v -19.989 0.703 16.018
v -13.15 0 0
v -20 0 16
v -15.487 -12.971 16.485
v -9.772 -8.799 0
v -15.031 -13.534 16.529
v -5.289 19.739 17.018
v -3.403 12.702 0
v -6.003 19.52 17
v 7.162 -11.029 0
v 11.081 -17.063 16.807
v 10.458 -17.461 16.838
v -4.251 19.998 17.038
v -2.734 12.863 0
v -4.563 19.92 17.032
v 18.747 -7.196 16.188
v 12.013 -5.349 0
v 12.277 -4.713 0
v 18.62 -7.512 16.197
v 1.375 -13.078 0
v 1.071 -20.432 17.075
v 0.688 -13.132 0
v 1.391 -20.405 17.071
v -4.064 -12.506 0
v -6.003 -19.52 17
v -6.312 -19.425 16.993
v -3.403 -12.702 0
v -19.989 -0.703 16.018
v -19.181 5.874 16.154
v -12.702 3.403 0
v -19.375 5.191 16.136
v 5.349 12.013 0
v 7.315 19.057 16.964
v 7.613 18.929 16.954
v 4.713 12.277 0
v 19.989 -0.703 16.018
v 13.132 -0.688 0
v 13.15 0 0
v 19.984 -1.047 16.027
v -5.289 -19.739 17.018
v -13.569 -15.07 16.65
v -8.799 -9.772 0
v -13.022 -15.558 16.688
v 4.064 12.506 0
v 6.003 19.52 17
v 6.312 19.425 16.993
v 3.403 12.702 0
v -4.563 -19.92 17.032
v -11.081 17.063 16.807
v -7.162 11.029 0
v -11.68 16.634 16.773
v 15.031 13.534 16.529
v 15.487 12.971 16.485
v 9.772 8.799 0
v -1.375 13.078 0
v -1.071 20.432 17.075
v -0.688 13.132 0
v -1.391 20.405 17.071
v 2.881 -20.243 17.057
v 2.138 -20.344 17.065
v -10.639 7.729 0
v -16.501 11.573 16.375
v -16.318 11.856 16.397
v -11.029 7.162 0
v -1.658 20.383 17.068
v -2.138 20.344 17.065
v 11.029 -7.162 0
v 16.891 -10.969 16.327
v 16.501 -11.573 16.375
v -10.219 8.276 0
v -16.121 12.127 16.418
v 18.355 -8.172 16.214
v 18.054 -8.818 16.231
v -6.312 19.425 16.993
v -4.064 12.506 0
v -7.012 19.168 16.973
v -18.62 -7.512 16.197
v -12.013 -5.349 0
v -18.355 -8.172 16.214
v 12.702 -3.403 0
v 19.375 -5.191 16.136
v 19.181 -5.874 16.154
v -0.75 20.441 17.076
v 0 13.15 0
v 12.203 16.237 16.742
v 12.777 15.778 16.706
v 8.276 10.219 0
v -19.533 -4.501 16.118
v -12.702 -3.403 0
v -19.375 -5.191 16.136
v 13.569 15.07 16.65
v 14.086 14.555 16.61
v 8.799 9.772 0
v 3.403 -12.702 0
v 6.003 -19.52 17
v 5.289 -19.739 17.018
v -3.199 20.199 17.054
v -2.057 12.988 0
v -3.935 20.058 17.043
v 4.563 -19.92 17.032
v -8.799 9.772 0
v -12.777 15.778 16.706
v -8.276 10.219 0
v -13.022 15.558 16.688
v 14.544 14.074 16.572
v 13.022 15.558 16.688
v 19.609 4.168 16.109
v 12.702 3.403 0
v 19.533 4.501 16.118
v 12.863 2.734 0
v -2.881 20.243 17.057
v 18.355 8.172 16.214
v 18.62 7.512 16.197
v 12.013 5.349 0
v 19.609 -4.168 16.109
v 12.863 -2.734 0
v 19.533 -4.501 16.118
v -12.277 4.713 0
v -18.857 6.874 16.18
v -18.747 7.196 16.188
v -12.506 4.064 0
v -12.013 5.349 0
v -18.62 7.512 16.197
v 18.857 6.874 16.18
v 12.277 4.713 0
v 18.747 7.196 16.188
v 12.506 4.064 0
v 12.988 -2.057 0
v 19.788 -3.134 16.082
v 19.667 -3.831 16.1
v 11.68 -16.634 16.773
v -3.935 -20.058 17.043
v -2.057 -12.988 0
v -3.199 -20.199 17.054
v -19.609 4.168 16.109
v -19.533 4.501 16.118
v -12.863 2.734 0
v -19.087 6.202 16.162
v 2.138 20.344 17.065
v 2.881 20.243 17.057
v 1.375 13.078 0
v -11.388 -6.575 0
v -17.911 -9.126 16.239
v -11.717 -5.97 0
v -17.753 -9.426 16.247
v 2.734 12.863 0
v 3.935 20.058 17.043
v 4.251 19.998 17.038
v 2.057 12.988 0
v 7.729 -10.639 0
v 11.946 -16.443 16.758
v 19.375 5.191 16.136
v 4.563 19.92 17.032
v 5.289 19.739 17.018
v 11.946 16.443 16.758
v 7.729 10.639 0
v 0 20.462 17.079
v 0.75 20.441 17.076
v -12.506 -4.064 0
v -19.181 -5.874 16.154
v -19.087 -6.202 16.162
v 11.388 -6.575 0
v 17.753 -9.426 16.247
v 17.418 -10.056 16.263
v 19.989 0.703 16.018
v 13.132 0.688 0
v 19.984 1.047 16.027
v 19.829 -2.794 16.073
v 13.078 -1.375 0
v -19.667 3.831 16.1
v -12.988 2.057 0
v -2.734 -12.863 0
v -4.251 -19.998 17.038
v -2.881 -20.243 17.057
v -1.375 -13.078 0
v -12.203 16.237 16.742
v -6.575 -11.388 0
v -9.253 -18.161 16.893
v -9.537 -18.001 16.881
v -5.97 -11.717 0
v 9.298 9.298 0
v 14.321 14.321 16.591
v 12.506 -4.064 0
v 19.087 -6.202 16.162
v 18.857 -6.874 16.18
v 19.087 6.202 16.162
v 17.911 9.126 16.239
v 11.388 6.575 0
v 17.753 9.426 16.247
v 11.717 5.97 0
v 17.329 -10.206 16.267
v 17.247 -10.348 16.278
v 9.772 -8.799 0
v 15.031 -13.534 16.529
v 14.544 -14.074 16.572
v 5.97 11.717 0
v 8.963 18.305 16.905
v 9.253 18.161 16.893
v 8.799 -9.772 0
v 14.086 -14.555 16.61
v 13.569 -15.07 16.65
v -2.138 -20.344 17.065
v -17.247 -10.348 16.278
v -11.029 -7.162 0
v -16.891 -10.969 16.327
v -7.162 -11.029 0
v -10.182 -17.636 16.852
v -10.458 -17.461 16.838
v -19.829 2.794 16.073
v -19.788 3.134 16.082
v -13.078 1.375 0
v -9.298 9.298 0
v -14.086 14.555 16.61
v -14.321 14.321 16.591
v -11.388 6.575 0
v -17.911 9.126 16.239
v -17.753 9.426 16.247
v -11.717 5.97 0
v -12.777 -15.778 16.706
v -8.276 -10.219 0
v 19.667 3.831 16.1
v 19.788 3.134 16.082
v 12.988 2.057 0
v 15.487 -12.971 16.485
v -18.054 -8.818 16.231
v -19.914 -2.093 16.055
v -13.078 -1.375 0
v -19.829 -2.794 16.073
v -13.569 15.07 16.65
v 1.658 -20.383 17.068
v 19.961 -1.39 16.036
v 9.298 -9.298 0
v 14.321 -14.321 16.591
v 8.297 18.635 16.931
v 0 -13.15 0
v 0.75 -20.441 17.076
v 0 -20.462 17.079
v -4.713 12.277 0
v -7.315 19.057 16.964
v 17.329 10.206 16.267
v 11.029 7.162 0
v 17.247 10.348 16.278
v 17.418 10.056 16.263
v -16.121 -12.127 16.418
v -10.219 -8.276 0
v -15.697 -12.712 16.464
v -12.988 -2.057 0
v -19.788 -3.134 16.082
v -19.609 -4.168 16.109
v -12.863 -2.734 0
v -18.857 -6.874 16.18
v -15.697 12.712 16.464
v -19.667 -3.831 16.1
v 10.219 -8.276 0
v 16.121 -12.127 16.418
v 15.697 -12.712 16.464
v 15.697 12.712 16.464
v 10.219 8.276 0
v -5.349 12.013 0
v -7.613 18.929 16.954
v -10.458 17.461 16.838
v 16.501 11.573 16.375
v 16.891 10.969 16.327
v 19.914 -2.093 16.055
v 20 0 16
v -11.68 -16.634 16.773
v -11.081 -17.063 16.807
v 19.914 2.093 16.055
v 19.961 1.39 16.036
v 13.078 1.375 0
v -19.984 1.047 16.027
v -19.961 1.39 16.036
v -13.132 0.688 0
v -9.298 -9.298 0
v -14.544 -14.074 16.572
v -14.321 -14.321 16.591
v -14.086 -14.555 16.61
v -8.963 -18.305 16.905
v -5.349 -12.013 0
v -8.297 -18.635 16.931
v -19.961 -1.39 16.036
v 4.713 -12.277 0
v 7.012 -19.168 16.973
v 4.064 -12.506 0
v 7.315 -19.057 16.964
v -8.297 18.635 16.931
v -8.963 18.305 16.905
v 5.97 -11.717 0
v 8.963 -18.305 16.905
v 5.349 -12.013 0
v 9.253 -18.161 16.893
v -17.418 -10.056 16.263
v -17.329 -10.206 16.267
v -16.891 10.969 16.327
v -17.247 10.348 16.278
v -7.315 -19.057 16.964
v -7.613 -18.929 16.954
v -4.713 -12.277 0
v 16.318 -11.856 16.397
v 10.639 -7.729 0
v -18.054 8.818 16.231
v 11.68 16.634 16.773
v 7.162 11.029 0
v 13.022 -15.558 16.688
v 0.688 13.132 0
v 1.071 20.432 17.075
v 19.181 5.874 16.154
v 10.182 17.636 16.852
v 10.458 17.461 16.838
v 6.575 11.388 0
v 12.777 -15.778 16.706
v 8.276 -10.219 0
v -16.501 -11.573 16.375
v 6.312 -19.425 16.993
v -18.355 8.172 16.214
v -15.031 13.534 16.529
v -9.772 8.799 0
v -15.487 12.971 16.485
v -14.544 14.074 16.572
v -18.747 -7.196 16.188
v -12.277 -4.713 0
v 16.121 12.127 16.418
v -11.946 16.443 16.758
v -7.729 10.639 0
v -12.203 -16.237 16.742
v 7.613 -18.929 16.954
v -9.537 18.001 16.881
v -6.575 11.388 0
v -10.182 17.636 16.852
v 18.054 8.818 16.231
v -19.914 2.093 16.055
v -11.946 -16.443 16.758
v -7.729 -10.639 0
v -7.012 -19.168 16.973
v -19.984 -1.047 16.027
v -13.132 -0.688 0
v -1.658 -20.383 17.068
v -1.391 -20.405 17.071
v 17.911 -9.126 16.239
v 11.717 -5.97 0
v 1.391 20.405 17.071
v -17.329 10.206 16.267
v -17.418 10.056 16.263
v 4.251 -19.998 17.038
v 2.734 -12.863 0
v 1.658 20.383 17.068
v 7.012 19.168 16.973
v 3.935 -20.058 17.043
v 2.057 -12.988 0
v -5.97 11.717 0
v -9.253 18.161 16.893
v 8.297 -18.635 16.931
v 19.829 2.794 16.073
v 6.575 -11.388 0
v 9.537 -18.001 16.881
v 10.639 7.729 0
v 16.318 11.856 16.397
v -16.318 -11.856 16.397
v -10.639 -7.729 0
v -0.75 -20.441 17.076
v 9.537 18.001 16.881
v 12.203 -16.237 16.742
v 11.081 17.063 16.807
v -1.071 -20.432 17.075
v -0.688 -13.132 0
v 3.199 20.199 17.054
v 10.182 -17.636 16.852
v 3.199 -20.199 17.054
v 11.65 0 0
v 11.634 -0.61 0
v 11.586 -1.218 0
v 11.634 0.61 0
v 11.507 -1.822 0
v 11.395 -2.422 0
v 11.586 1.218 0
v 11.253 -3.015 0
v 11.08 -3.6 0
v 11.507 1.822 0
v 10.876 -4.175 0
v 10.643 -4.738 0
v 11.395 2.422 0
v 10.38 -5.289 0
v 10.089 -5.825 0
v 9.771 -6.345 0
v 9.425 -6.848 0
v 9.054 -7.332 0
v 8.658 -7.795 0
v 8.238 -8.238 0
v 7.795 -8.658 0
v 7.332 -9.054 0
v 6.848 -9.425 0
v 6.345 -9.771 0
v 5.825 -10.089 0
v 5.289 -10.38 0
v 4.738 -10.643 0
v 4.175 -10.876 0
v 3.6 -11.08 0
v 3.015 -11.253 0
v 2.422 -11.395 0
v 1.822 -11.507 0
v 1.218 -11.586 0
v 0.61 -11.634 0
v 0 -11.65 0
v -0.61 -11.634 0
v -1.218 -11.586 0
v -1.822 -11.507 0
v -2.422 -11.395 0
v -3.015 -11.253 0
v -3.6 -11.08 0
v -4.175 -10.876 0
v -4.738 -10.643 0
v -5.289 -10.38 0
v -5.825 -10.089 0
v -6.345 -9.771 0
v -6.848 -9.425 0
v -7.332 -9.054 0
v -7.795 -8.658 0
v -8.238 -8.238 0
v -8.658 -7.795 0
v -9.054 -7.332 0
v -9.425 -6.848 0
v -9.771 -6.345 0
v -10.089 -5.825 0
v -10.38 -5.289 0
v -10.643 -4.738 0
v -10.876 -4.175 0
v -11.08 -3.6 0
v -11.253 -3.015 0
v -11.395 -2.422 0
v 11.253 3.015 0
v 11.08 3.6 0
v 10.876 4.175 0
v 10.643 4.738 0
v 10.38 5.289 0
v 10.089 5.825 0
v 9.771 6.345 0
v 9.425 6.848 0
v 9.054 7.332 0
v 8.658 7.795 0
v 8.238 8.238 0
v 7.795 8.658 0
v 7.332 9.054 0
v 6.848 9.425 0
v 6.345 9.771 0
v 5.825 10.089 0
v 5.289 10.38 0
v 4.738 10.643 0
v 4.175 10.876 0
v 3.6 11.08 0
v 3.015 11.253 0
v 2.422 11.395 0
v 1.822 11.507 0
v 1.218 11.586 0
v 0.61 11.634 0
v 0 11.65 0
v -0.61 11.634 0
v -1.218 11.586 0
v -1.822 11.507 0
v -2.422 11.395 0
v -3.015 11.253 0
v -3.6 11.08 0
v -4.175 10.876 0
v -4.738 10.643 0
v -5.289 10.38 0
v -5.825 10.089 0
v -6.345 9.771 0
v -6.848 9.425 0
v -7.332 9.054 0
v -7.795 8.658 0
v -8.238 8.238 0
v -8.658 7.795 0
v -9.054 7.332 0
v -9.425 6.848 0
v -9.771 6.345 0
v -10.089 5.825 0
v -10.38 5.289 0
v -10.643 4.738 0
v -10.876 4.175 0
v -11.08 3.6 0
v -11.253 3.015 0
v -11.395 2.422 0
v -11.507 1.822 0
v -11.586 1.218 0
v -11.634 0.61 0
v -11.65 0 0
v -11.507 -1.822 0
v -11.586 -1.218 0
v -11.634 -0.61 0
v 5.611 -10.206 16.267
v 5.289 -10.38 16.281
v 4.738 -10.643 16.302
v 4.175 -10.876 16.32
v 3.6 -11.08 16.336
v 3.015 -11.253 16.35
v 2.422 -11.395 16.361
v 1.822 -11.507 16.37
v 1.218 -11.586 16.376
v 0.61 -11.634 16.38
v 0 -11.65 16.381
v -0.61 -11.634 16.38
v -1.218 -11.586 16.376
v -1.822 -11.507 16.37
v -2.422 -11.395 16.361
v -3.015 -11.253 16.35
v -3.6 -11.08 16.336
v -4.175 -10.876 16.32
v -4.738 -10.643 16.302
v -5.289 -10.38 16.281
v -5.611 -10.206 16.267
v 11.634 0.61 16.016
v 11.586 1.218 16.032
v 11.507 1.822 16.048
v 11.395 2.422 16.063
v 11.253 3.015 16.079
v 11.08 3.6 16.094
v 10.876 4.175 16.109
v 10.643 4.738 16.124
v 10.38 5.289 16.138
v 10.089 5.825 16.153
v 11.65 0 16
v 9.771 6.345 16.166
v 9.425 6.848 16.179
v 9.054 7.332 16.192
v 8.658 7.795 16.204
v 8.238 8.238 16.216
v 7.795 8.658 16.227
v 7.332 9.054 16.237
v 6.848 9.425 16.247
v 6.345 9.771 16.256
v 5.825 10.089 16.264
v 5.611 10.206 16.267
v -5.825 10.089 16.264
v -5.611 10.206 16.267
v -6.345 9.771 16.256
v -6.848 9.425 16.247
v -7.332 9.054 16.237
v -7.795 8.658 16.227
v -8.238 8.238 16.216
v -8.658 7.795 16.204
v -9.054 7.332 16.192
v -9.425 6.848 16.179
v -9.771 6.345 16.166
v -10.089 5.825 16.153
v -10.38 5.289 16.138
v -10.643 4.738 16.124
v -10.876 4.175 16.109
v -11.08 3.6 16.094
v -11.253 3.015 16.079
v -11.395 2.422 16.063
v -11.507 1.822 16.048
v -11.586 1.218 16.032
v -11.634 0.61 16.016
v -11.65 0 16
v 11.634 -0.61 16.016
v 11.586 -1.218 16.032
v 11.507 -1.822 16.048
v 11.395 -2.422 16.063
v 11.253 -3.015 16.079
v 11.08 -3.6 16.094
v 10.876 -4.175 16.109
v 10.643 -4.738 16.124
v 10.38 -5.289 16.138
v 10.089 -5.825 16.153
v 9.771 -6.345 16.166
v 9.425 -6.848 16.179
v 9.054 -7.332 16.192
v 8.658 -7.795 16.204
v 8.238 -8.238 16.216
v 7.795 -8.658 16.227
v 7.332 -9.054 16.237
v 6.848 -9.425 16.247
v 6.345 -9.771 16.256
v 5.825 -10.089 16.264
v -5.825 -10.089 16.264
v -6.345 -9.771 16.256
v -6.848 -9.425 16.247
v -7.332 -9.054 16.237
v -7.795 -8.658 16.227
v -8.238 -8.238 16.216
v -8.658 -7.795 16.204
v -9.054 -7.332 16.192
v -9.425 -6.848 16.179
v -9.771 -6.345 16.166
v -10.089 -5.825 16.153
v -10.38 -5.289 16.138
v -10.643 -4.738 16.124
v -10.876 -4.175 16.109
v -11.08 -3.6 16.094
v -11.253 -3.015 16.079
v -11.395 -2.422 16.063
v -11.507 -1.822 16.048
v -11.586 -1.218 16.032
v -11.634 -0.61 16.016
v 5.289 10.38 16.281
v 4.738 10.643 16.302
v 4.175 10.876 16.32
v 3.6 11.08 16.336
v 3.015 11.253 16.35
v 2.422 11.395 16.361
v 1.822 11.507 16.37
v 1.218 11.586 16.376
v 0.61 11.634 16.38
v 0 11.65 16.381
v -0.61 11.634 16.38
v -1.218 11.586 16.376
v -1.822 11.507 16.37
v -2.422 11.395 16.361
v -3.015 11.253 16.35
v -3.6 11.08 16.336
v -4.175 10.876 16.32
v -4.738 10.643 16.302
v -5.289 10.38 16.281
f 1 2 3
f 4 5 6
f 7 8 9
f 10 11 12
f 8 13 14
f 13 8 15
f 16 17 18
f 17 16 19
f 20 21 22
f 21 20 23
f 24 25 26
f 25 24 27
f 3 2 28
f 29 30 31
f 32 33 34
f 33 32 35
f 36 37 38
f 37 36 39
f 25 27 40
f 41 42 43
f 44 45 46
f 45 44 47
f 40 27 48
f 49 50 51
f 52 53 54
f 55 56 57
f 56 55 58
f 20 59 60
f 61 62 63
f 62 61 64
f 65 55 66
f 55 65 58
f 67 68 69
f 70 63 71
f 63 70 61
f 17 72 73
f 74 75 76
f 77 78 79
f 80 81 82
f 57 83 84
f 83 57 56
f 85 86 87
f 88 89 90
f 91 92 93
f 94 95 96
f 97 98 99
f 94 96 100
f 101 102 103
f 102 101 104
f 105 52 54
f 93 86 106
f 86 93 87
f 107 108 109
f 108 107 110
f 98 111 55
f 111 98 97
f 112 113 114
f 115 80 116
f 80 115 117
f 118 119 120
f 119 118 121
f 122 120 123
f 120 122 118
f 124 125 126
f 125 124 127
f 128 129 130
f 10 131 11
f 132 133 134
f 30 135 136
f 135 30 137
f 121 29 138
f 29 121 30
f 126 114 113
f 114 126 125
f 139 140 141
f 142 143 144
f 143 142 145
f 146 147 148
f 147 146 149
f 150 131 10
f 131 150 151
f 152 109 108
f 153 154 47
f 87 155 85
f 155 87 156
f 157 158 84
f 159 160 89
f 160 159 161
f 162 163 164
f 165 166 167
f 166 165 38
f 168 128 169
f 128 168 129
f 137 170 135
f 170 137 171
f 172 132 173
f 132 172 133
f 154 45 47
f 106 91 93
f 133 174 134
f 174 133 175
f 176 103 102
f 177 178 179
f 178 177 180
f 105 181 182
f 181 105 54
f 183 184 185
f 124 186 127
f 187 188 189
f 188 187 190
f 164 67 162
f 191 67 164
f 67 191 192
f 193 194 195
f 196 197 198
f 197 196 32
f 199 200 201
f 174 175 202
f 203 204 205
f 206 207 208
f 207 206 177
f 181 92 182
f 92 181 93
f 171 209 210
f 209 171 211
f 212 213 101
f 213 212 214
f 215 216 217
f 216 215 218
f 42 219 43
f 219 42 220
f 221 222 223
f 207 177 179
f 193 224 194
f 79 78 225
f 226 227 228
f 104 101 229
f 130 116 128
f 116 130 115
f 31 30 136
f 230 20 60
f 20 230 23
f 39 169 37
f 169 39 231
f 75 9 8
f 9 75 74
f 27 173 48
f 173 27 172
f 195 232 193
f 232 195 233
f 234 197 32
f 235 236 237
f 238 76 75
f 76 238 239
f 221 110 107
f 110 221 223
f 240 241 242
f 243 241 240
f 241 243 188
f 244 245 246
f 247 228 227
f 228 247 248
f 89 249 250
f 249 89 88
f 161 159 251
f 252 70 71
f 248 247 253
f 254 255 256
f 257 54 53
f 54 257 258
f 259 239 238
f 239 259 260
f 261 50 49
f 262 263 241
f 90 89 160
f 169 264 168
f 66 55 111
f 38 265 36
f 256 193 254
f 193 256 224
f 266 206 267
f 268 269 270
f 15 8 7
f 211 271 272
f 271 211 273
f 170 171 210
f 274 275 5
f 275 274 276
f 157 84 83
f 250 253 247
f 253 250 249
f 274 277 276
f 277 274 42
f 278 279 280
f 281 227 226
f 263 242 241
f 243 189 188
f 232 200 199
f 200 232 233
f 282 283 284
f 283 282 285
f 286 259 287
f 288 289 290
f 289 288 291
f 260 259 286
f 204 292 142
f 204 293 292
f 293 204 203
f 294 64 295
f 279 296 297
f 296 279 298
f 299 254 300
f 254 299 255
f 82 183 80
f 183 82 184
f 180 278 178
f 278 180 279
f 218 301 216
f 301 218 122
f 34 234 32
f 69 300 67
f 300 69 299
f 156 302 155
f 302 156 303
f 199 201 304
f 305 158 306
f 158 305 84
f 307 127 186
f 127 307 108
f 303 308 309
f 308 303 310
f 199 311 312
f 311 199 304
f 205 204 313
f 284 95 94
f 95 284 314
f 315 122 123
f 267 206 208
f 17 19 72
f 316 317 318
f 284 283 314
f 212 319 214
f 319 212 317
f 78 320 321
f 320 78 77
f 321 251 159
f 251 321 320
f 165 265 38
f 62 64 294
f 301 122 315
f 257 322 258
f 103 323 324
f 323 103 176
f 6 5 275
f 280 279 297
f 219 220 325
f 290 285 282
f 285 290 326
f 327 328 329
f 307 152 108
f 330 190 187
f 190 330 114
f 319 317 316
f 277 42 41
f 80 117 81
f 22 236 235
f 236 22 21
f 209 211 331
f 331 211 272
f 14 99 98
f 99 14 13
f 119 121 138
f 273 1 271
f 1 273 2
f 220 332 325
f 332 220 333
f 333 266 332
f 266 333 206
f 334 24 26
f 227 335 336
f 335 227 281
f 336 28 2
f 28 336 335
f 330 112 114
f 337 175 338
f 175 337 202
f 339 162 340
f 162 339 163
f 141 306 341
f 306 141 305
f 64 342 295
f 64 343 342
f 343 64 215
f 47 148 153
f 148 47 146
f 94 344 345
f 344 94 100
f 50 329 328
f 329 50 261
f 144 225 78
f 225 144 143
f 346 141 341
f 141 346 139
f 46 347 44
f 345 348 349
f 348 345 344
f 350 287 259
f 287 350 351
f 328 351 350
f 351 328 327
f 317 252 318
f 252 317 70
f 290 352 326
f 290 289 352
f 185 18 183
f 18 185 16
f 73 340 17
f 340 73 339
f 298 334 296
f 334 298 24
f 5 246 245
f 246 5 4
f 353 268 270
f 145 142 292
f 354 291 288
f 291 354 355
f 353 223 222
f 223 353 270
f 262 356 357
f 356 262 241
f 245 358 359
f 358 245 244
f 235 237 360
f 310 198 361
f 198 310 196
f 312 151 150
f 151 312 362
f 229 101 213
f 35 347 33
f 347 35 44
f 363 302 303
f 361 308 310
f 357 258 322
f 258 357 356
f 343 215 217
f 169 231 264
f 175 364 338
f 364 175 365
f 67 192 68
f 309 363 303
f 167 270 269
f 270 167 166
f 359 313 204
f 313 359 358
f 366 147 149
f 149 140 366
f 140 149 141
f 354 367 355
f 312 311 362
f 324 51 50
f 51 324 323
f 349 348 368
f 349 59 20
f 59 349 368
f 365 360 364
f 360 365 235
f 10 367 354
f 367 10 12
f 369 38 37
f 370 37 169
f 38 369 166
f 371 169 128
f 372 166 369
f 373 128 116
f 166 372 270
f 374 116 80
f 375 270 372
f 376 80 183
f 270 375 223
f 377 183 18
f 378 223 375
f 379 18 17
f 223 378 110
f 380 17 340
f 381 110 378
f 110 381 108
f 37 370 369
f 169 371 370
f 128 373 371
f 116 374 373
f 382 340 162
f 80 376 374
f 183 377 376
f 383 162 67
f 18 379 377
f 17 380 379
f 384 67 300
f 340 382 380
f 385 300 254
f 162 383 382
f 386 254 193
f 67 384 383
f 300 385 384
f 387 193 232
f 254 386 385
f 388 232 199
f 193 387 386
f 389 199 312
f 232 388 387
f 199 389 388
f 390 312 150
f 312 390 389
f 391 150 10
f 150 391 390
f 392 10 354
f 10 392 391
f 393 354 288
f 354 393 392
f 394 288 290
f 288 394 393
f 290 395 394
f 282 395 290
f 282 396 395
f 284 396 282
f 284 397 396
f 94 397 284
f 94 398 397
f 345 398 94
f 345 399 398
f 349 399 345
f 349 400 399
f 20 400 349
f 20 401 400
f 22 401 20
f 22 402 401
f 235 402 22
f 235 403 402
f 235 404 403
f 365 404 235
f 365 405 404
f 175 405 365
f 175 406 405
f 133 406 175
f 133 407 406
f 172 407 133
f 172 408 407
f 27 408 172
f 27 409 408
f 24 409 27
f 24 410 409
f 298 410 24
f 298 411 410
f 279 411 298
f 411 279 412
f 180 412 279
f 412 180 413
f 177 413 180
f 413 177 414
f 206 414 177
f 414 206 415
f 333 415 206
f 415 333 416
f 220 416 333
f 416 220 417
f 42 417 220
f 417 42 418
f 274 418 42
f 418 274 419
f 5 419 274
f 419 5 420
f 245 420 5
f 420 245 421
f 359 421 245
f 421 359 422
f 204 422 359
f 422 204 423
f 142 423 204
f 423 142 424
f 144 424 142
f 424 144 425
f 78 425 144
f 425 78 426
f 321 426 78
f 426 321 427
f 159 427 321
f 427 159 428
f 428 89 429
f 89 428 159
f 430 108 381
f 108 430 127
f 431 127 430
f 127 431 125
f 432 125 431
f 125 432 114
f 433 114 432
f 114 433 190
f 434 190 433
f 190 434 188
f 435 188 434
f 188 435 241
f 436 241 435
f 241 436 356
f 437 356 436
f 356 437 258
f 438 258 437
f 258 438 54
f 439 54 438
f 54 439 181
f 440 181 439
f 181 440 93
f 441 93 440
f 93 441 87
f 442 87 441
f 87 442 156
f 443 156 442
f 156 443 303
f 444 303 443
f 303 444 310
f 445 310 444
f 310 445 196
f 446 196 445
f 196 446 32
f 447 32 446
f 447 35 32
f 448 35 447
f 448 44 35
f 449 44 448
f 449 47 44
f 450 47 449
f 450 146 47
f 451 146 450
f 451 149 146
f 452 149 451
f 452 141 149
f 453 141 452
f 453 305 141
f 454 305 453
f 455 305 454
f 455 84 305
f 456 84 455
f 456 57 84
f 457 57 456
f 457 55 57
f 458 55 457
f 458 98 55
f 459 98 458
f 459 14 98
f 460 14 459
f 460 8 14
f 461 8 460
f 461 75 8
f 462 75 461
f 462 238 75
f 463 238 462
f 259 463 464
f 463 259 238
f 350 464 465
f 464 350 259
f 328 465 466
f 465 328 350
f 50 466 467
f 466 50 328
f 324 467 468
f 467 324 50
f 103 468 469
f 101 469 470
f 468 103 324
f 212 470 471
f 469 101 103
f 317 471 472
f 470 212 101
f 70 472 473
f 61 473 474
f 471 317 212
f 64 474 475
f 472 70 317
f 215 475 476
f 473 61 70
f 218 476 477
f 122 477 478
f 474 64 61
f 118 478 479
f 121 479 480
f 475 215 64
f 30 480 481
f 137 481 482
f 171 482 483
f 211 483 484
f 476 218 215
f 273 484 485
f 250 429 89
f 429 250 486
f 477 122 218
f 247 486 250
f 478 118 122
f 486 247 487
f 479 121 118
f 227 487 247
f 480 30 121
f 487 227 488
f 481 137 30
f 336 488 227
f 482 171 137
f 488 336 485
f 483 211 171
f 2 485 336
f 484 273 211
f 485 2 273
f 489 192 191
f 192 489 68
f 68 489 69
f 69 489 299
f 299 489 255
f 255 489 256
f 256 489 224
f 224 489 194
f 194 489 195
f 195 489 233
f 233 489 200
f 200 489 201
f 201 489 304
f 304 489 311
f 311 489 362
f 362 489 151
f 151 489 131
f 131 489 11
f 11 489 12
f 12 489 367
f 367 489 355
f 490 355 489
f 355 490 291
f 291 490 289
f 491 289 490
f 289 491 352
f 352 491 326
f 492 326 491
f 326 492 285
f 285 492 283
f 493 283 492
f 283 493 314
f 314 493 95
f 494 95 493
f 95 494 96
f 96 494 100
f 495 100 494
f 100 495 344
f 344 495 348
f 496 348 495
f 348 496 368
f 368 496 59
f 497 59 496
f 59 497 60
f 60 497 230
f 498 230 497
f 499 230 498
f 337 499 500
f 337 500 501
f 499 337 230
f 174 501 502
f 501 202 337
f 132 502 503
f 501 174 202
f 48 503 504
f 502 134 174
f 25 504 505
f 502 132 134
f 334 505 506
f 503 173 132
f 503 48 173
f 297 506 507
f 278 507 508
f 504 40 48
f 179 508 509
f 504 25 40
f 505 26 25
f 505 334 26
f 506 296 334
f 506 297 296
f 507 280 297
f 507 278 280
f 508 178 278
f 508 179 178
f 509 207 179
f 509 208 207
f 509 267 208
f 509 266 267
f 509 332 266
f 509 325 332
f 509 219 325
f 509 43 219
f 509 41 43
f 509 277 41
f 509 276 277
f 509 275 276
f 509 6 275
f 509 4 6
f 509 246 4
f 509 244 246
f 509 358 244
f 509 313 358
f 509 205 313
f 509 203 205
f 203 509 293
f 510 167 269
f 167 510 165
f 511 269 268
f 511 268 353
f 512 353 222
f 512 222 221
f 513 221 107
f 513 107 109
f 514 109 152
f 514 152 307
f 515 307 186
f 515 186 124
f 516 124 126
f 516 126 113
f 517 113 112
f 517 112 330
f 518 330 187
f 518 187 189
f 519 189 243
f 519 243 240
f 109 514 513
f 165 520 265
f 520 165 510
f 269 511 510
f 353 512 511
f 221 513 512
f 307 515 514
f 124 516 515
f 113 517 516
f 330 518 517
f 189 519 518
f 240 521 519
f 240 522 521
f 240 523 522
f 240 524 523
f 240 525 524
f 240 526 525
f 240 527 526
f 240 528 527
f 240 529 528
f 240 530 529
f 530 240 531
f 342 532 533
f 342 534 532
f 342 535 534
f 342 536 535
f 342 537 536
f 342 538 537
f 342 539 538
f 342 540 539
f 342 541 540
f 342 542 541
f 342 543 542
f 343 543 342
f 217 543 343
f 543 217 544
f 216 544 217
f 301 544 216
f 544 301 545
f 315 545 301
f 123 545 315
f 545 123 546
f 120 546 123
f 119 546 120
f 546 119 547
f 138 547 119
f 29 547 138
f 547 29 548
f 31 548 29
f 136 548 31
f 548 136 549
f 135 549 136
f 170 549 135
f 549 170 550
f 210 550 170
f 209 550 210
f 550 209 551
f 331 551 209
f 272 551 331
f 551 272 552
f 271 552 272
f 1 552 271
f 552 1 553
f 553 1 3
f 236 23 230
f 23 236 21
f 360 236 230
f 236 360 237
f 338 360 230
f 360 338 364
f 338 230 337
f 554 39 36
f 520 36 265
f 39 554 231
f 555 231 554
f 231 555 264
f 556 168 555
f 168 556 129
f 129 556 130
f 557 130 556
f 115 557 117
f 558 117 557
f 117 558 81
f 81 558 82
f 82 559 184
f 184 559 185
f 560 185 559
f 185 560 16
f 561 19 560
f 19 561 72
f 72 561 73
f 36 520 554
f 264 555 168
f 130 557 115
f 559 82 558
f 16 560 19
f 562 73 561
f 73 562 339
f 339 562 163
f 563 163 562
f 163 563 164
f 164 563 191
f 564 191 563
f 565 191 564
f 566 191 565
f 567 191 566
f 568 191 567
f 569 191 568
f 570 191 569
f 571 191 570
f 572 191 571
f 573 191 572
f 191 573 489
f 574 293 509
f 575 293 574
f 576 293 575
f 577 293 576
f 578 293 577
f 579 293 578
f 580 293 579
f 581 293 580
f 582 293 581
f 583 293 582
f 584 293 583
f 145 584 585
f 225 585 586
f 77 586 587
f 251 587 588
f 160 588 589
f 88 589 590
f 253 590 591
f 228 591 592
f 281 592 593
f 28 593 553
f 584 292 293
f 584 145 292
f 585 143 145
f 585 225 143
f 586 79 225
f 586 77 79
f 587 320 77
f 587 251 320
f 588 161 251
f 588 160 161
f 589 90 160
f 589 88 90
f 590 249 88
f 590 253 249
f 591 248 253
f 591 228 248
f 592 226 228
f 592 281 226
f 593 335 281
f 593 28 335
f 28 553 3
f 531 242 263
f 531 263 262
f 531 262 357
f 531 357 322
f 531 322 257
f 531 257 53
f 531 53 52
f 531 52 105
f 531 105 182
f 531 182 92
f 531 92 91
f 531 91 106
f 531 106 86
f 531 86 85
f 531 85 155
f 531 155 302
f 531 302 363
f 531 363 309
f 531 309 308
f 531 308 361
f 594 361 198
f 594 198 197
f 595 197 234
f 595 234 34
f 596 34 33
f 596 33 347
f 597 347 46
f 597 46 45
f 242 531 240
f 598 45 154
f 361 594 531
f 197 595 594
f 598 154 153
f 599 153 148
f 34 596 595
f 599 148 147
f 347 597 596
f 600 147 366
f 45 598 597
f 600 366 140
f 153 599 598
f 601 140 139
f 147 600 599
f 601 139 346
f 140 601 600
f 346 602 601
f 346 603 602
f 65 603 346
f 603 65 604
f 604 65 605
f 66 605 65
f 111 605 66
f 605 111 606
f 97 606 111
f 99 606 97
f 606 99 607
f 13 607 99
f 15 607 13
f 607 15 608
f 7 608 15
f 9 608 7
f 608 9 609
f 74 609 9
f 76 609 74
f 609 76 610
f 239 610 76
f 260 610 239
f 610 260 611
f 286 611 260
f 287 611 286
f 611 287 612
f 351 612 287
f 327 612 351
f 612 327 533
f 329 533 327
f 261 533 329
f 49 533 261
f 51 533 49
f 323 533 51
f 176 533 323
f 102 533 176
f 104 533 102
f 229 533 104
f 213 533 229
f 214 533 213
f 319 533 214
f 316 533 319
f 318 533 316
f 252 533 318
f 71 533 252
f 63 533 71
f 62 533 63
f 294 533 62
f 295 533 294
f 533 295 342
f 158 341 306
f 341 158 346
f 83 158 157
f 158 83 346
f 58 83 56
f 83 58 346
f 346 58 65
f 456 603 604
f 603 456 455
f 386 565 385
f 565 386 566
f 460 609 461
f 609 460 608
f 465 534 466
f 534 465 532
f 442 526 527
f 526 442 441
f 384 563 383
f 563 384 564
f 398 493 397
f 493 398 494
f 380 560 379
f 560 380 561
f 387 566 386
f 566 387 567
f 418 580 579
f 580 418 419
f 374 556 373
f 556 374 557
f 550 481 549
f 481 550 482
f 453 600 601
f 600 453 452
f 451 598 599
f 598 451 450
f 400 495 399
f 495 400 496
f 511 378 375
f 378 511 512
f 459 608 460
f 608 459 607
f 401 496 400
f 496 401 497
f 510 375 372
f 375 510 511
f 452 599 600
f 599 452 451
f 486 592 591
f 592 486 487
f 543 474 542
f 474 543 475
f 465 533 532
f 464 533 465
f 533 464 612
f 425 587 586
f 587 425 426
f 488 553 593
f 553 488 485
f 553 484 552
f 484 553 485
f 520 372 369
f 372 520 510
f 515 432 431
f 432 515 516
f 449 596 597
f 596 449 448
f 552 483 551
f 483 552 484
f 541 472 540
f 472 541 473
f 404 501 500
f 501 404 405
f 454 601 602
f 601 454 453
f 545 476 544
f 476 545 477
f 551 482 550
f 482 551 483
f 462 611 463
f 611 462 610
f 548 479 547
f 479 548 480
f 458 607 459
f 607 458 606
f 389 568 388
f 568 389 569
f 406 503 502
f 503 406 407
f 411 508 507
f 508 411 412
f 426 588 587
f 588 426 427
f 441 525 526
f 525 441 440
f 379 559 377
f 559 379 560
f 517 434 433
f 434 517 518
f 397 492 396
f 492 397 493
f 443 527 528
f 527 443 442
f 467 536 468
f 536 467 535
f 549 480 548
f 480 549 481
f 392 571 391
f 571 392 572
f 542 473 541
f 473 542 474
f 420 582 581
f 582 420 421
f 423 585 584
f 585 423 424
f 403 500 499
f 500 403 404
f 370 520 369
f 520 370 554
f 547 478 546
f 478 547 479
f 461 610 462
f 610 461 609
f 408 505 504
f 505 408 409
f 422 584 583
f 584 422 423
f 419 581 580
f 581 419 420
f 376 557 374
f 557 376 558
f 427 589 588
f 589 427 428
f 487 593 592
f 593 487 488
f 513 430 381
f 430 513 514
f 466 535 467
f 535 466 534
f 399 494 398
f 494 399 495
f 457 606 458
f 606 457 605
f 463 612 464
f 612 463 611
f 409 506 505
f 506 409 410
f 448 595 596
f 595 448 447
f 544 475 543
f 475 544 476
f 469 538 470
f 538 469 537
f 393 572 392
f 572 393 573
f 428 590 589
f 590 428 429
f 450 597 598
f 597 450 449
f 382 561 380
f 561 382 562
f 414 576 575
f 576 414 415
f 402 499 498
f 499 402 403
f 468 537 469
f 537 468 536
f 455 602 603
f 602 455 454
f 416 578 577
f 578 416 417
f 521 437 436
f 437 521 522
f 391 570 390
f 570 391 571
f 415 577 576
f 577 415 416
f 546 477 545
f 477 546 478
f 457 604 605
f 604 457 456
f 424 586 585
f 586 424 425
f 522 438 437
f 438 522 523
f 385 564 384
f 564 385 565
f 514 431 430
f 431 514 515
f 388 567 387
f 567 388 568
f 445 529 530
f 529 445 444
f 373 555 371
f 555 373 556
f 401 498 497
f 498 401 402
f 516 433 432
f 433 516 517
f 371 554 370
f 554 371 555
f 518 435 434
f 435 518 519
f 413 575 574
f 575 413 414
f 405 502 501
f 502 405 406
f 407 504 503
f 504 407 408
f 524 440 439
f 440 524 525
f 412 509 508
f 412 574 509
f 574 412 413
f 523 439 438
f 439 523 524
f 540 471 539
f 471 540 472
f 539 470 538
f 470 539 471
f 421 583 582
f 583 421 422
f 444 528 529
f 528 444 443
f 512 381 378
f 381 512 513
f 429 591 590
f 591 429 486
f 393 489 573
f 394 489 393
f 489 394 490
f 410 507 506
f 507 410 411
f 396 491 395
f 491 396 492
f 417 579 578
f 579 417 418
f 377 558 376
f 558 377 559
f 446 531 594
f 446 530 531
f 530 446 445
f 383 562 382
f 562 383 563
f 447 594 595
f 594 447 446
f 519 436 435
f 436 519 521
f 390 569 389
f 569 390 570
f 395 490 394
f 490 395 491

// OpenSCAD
// Jim Dodgen 2018
// round cooler "wall flange"

thickness=14.5;    // thickness of flange
width=40;       // narrow part width of flange  

radius =390/2;  // radius of cooler
hole_size=23.3;  // shank hole size
indent=1.5;      // recess depth

// end of custom 
// these should not need to be changed
height=thickness+indent;

$fs=0.2; // def 1, 0.2 is high res
$fa=3;//def 12, 3 is very nice

translate([0,0,height]) {
    rotate([0,180,0]){
        intersection() {
            difference() { 
                translate([0,0,0]) {
                    top_radius=(hole_size/2)+1.5;
                    cylinder(h=height*2, r2=top_radius, 
                        r1=width-top_radius, center=true);
                }  
                translate([0,0,-radius]) { // cut base curve
                    rotate([0,90,0]) {
                        cylinder(h=width*2,r=radius, center=true); 
                    }       
                }
                cylinder(h=height*2,r=hole_size/2, 
                    center=true); // drill hole               
            }           
        }
    }
}
